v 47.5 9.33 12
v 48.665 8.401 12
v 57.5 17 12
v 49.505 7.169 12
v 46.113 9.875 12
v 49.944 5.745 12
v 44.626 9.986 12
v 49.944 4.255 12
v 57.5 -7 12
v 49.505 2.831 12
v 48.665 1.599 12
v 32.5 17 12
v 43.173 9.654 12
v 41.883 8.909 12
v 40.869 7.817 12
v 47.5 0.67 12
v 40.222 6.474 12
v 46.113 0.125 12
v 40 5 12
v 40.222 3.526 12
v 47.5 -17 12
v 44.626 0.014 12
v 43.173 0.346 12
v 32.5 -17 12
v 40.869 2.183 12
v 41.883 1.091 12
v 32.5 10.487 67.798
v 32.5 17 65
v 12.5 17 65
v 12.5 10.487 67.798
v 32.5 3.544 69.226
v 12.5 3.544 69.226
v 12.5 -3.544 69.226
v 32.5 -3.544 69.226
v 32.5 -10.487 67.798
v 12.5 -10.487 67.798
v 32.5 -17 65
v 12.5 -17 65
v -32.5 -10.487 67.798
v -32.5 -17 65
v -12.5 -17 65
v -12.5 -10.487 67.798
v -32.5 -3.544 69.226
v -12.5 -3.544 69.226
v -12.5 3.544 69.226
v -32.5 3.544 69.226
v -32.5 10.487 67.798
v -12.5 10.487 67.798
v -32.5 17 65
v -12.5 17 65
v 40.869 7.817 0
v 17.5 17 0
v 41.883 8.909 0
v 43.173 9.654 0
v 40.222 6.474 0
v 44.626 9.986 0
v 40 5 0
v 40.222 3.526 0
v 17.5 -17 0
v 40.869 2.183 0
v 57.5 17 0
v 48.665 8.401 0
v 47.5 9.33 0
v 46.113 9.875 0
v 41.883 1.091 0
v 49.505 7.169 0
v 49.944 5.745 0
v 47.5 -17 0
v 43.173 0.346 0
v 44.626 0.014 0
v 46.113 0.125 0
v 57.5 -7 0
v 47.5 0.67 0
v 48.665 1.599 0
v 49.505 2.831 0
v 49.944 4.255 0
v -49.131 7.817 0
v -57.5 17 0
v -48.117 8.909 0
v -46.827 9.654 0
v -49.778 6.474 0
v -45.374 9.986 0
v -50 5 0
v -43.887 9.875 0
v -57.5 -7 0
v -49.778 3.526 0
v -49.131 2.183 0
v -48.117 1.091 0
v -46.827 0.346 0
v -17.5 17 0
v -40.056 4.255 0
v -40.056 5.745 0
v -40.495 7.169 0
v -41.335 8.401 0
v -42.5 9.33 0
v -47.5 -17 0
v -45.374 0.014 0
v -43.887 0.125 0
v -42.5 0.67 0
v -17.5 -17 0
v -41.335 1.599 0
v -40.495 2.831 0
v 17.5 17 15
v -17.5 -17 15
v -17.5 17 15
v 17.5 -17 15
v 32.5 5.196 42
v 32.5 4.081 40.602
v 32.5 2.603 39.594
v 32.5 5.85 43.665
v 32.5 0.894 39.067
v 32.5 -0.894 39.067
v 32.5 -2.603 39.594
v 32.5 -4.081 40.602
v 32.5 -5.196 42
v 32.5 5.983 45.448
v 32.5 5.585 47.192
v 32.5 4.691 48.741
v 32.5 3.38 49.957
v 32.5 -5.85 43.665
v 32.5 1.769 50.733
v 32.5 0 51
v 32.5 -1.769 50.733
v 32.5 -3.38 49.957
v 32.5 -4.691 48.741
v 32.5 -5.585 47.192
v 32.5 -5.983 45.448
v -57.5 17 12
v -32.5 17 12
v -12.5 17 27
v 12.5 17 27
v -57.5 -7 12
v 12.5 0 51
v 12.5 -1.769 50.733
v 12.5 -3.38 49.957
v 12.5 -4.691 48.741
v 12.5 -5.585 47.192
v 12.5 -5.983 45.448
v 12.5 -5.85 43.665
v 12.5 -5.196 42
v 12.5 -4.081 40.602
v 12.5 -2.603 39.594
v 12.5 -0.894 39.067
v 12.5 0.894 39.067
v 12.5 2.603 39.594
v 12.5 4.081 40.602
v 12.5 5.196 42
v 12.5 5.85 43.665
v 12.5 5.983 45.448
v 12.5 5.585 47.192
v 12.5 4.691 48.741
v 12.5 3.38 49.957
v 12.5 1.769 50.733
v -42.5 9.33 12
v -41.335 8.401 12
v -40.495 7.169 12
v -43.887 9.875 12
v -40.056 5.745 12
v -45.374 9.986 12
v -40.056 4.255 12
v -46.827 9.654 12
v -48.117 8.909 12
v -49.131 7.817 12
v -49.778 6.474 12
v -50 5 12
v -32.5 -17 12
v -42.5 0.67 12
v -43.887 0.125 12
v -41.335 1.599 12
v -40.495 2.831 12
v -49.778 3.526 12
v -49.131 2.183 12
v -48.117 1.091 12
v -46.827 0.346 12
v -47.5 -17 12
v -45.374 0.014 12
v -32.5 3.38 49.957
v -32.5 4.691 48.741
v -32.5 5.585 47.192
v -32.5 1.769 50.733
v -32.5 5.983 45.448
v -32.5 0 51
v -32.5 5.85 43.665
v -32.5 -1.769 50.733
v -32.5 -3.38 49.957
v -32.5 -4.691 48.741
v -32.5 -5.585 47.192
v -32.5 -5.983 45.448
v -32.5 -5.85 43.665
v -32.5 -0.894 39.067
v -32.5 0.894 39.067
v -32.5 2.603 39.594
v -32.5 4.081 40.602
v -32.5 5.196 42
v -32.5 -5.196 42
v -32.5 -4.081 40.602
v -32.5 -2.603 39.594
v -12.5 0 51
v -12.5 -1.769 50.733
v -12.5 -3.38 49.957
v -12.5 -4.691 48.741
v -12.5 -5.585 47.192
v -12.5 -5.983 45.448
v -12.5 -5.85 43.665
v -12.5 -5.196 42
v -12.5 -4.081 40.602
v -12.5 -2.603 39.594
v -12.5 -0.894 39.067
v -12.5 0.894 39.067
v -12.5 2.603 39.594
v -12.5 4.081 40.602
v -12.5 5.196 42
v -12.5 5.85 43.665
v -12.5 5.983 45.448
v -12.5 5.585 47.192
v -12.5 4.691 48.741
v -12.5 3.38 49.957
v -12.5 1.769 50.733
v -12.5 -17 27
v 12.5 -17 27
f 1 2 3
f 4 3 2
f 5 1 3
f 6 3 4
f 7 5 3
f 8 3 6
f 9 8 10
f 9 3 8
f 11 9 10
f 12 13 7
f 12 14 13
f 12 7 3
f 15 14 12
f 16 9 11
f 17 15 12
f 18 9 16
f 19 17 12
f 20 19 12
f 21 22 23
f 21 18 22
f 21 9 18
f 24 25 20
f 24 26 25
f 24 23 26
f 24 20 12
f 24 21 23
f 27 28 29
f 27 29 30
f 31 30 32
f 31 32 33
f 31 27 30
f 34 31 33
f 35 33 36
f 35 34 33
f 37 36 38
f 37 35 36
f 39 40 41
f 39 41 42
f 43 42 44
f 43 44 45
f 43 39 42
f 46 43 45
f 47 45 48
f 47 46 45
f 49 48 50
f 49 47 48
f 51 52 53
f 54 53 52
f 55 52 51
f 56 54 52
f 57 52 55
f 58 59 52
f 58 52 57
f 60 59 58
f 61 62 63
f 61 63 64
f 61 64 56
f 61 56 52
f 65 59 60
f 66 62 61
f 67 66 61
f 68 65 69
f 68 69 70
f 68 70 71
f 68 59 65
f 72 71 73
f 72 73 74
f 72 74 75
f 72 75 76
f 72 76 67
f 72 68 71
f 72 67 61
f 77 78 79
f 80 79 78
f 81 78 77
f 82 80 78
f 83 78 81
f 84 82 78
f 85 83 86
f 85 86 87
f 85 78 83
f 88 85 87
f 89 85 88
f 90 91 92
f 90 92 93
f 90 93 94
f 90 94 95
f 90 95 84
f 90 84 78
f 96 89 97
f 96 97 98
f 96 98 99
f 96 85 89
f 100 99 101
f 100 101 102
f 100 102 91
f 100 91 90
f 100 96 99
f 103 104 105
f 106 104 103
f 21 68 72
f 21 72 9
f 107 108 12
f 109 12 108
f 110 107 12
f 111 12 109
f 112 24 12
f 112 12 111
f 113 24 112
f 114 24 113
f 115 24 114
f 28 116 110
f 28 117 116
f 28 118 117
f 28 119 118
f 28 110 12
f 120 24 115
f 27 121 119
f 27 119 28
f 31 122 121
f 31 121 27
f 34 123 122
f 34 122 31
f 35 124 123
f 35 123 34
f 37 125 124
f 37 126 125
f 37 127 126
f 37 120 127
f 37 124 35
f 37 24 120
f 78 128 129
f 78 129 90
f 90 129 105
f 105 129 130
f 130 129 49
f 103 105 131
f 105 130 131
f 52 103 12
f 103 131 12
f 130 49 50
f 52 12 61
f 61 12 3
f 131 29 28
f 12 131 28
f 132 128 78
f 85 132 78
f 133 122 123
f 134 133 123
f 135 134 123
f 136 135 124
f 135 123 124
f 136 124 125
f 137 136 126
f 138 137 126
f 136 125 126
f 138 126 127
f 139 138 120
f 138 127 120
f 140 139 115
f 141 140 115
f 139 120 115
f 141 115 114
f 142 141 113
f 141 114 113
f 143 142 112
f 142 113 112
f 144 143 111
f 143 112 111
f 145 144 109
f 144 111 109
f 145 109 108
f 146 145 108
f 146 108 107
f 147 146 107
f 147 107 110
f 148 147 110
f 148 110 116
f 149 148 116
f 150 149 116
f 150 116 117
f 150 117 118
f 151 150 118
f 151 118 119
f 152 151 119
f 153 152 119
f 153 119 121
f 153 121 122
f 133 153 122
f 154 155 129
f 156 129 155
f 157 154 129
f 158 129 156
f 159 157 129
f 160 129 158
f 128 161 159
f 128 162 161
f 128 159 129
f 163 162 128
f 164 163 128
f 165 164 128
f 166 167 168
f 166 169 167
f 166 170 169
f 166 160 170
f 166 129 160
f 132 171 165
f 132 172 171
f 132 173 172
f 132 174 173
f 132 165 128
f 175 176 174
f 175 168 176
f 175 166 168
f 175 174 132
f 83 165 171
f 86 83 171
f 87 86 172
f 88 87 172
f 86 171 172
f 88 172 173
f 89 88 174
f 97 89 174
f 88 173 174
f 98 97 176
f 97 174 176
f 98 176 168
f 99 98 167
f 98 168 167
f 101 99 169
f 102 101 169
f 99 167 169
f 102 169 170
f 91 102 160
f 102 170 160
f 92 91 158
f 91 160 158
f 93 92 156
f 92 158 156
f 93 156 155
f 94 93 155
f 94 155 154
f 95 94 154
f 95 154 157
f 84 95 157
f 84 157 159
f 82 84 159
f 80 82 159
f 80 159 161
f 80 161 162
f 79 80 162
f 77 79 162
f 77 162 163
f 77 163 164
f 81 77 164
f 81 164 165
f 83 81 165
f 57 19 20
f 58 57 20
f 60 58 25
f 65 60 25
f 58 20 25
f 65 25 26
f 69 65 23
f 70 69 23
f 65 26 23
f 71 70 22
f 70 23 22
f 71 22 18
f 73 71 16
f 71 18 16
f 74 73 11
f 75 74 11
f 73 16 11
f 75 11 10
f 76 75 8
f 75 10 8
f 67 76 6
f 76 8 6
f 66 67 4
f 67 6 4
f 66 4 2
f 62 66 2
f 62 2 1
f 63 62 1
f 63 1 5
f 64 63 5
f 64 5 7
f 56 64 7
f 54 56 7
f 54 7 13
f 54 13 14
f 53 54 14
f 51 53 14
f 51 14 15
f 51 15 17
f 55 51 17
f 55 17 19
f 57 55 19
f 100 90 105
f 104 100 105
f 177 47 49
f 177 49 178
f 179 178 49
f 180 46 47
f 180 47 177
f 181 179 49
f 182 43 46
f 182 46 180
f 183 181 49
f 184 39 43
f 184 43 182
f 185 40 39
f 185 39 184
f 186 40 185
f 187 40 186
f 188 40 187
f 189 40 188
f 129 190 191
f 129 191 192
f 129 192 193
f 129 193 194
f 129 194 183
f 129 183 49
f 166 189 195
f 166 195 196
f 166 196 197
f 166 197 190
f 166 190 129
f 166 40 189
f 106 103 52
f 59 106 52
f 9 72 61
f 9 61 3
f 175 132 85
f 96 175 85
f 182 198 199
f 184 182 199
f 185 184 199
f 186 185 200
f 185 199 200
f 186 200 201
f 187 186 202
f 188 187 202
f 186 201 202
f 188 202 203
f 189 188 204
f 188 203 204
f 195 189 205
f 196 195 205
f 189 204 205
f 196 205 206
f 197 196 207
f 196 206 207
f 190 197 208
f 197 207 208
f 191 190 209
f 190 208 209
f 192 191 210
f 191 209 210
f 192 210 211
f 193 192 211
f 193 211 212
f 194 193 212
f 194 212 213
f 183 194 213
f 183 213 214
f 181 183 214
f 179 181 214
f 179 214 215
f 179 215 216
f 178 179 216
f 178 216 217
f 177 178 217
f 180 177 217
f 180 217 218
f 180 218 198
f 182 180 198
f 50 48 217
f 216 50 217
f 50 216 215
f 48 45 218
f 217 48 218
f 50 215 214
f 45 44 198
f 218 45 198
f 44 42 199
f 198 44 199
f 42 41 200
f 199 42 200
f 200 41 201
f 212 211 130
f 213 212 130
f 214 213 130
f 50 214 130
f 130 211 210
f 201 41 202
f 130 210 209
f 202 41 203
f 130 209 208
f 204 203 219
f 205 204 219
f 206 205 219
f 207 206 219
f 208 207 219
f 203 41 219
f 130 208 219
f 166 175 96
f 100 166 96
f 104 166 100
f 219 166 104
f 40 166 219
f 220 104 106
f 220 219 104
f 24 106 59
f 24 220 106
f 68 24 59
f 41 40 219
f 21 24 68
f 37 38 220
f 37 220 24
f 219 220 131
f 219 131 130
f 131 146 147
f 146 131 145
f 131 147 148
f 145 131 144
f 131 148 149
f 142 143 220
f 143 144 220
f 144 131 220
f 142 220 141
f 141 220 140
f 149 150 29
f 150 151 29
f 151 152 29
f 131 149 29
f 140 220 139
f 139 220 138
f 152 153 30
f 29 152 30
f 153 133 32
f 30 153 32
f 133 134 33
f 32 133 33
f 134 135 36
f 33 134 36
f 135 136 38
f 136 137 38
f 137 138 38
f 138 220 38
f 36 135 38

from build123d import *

# Parameters (mm, degrees)
PAD_DEPTH       = 17
CHAMFER_SIZE    = 10
CHAMFER001_SIZE = 10
SKETCH001_R     = 5
POCKET_DEPTH    = 12.001
PAD001_DEPTH    = 20
PAD002_DEPTH    = 20
SKETCH004_R     = 6
POCKET001_DEPTH = 90.001


with BuildPart() as part:
    # Sketch → Pad (new body, symmetric)
    with BuildSketch(Plane.XZ):
        Polygon((-57.5, 0), (-17.5, 0), (-17.5, 15), (17.5, 15), (17.5, 0), (57.5, 0), (57.5, 12), (32.5, 12), (32.5, 65), (12.5, 65), (12.5, 27), (-12.5, 27), (-12.5, 65), (-32.5, 65), (-32.5, 12), (-57.5, 12), align=None)
    extrude(amount=PAD_DEPTH, both=True)

    # Chamfer
    chamfer_edges = [part.edges().sort_by_distance(p)[0] for p in [
        (57.5, -17, 6),
    ]]
    chamfer(chamfer_edges, length=CHAMFER_SIZE)

    # Chamfer001
    chamfer001_edges = [part.edges().sort_by_distance(p)[0] for p in [
        (-57.5, -17, 6),
    ]]
    chamfer(chamfer001_edges, length=CHAMFER001_SIZE)

    # Sketch001 → Pocket (cut, through all)
    with BuildSketch(Plane(origin=(0, 0, 12), x_dir=(-1, 0, 0), z_dir=(0, 0, 1))):
        with Locations((45, -5)):
            Circle(SKETCH001_R)
        with Locations((-45, -5)):
            Circle(SKETCH001_R)
    extrude(amount=-POCKET_DEPTH, mode=Mode.SUBTRACT)

    # Sketch002 → Pad001 (new body)
    with BuildSketch(Plane(origin=(32.5, 0, 0), x_dir=(0, 0, 1), z_dir=(1, 0, 0))):
        with BuildLine():
            ThreePointArc((65, -17), (69.405883, 0), (65, 17))
            Line((65, 17), (65, -17))
        make_face()
    extrude(amount=-PAD001_DEPTH)

    # Sketch003 → Pad002 (new body)
    with BuildSketch(Plane(origin=(-32.5, 0, 0), x_dir=(0, 0, -1), z_dir=(-1, 0, 0))):
        with BuildLine():
            ThreePointArc((-65, 17), (-69.405883, 0), (-65, -17))
            Line((-65, 17), (-65, -17))
        make_face()
    extrude(amount=-PAD002_DEPTH)

    # Sketch004 → Pocket001 (cut, through all)
    with BuildSketch(Plane(origin=(32.5, 0, 0), x_dir=(0, 0, 1), z_dir=(1, 0, 0))):
        with Locations((45, 0)):
            Circle(SKETCH004_R)
    extrude(amount=-POCKET001_DEPTH, mode=Mode.SUBTRACT)


solid = part.part
